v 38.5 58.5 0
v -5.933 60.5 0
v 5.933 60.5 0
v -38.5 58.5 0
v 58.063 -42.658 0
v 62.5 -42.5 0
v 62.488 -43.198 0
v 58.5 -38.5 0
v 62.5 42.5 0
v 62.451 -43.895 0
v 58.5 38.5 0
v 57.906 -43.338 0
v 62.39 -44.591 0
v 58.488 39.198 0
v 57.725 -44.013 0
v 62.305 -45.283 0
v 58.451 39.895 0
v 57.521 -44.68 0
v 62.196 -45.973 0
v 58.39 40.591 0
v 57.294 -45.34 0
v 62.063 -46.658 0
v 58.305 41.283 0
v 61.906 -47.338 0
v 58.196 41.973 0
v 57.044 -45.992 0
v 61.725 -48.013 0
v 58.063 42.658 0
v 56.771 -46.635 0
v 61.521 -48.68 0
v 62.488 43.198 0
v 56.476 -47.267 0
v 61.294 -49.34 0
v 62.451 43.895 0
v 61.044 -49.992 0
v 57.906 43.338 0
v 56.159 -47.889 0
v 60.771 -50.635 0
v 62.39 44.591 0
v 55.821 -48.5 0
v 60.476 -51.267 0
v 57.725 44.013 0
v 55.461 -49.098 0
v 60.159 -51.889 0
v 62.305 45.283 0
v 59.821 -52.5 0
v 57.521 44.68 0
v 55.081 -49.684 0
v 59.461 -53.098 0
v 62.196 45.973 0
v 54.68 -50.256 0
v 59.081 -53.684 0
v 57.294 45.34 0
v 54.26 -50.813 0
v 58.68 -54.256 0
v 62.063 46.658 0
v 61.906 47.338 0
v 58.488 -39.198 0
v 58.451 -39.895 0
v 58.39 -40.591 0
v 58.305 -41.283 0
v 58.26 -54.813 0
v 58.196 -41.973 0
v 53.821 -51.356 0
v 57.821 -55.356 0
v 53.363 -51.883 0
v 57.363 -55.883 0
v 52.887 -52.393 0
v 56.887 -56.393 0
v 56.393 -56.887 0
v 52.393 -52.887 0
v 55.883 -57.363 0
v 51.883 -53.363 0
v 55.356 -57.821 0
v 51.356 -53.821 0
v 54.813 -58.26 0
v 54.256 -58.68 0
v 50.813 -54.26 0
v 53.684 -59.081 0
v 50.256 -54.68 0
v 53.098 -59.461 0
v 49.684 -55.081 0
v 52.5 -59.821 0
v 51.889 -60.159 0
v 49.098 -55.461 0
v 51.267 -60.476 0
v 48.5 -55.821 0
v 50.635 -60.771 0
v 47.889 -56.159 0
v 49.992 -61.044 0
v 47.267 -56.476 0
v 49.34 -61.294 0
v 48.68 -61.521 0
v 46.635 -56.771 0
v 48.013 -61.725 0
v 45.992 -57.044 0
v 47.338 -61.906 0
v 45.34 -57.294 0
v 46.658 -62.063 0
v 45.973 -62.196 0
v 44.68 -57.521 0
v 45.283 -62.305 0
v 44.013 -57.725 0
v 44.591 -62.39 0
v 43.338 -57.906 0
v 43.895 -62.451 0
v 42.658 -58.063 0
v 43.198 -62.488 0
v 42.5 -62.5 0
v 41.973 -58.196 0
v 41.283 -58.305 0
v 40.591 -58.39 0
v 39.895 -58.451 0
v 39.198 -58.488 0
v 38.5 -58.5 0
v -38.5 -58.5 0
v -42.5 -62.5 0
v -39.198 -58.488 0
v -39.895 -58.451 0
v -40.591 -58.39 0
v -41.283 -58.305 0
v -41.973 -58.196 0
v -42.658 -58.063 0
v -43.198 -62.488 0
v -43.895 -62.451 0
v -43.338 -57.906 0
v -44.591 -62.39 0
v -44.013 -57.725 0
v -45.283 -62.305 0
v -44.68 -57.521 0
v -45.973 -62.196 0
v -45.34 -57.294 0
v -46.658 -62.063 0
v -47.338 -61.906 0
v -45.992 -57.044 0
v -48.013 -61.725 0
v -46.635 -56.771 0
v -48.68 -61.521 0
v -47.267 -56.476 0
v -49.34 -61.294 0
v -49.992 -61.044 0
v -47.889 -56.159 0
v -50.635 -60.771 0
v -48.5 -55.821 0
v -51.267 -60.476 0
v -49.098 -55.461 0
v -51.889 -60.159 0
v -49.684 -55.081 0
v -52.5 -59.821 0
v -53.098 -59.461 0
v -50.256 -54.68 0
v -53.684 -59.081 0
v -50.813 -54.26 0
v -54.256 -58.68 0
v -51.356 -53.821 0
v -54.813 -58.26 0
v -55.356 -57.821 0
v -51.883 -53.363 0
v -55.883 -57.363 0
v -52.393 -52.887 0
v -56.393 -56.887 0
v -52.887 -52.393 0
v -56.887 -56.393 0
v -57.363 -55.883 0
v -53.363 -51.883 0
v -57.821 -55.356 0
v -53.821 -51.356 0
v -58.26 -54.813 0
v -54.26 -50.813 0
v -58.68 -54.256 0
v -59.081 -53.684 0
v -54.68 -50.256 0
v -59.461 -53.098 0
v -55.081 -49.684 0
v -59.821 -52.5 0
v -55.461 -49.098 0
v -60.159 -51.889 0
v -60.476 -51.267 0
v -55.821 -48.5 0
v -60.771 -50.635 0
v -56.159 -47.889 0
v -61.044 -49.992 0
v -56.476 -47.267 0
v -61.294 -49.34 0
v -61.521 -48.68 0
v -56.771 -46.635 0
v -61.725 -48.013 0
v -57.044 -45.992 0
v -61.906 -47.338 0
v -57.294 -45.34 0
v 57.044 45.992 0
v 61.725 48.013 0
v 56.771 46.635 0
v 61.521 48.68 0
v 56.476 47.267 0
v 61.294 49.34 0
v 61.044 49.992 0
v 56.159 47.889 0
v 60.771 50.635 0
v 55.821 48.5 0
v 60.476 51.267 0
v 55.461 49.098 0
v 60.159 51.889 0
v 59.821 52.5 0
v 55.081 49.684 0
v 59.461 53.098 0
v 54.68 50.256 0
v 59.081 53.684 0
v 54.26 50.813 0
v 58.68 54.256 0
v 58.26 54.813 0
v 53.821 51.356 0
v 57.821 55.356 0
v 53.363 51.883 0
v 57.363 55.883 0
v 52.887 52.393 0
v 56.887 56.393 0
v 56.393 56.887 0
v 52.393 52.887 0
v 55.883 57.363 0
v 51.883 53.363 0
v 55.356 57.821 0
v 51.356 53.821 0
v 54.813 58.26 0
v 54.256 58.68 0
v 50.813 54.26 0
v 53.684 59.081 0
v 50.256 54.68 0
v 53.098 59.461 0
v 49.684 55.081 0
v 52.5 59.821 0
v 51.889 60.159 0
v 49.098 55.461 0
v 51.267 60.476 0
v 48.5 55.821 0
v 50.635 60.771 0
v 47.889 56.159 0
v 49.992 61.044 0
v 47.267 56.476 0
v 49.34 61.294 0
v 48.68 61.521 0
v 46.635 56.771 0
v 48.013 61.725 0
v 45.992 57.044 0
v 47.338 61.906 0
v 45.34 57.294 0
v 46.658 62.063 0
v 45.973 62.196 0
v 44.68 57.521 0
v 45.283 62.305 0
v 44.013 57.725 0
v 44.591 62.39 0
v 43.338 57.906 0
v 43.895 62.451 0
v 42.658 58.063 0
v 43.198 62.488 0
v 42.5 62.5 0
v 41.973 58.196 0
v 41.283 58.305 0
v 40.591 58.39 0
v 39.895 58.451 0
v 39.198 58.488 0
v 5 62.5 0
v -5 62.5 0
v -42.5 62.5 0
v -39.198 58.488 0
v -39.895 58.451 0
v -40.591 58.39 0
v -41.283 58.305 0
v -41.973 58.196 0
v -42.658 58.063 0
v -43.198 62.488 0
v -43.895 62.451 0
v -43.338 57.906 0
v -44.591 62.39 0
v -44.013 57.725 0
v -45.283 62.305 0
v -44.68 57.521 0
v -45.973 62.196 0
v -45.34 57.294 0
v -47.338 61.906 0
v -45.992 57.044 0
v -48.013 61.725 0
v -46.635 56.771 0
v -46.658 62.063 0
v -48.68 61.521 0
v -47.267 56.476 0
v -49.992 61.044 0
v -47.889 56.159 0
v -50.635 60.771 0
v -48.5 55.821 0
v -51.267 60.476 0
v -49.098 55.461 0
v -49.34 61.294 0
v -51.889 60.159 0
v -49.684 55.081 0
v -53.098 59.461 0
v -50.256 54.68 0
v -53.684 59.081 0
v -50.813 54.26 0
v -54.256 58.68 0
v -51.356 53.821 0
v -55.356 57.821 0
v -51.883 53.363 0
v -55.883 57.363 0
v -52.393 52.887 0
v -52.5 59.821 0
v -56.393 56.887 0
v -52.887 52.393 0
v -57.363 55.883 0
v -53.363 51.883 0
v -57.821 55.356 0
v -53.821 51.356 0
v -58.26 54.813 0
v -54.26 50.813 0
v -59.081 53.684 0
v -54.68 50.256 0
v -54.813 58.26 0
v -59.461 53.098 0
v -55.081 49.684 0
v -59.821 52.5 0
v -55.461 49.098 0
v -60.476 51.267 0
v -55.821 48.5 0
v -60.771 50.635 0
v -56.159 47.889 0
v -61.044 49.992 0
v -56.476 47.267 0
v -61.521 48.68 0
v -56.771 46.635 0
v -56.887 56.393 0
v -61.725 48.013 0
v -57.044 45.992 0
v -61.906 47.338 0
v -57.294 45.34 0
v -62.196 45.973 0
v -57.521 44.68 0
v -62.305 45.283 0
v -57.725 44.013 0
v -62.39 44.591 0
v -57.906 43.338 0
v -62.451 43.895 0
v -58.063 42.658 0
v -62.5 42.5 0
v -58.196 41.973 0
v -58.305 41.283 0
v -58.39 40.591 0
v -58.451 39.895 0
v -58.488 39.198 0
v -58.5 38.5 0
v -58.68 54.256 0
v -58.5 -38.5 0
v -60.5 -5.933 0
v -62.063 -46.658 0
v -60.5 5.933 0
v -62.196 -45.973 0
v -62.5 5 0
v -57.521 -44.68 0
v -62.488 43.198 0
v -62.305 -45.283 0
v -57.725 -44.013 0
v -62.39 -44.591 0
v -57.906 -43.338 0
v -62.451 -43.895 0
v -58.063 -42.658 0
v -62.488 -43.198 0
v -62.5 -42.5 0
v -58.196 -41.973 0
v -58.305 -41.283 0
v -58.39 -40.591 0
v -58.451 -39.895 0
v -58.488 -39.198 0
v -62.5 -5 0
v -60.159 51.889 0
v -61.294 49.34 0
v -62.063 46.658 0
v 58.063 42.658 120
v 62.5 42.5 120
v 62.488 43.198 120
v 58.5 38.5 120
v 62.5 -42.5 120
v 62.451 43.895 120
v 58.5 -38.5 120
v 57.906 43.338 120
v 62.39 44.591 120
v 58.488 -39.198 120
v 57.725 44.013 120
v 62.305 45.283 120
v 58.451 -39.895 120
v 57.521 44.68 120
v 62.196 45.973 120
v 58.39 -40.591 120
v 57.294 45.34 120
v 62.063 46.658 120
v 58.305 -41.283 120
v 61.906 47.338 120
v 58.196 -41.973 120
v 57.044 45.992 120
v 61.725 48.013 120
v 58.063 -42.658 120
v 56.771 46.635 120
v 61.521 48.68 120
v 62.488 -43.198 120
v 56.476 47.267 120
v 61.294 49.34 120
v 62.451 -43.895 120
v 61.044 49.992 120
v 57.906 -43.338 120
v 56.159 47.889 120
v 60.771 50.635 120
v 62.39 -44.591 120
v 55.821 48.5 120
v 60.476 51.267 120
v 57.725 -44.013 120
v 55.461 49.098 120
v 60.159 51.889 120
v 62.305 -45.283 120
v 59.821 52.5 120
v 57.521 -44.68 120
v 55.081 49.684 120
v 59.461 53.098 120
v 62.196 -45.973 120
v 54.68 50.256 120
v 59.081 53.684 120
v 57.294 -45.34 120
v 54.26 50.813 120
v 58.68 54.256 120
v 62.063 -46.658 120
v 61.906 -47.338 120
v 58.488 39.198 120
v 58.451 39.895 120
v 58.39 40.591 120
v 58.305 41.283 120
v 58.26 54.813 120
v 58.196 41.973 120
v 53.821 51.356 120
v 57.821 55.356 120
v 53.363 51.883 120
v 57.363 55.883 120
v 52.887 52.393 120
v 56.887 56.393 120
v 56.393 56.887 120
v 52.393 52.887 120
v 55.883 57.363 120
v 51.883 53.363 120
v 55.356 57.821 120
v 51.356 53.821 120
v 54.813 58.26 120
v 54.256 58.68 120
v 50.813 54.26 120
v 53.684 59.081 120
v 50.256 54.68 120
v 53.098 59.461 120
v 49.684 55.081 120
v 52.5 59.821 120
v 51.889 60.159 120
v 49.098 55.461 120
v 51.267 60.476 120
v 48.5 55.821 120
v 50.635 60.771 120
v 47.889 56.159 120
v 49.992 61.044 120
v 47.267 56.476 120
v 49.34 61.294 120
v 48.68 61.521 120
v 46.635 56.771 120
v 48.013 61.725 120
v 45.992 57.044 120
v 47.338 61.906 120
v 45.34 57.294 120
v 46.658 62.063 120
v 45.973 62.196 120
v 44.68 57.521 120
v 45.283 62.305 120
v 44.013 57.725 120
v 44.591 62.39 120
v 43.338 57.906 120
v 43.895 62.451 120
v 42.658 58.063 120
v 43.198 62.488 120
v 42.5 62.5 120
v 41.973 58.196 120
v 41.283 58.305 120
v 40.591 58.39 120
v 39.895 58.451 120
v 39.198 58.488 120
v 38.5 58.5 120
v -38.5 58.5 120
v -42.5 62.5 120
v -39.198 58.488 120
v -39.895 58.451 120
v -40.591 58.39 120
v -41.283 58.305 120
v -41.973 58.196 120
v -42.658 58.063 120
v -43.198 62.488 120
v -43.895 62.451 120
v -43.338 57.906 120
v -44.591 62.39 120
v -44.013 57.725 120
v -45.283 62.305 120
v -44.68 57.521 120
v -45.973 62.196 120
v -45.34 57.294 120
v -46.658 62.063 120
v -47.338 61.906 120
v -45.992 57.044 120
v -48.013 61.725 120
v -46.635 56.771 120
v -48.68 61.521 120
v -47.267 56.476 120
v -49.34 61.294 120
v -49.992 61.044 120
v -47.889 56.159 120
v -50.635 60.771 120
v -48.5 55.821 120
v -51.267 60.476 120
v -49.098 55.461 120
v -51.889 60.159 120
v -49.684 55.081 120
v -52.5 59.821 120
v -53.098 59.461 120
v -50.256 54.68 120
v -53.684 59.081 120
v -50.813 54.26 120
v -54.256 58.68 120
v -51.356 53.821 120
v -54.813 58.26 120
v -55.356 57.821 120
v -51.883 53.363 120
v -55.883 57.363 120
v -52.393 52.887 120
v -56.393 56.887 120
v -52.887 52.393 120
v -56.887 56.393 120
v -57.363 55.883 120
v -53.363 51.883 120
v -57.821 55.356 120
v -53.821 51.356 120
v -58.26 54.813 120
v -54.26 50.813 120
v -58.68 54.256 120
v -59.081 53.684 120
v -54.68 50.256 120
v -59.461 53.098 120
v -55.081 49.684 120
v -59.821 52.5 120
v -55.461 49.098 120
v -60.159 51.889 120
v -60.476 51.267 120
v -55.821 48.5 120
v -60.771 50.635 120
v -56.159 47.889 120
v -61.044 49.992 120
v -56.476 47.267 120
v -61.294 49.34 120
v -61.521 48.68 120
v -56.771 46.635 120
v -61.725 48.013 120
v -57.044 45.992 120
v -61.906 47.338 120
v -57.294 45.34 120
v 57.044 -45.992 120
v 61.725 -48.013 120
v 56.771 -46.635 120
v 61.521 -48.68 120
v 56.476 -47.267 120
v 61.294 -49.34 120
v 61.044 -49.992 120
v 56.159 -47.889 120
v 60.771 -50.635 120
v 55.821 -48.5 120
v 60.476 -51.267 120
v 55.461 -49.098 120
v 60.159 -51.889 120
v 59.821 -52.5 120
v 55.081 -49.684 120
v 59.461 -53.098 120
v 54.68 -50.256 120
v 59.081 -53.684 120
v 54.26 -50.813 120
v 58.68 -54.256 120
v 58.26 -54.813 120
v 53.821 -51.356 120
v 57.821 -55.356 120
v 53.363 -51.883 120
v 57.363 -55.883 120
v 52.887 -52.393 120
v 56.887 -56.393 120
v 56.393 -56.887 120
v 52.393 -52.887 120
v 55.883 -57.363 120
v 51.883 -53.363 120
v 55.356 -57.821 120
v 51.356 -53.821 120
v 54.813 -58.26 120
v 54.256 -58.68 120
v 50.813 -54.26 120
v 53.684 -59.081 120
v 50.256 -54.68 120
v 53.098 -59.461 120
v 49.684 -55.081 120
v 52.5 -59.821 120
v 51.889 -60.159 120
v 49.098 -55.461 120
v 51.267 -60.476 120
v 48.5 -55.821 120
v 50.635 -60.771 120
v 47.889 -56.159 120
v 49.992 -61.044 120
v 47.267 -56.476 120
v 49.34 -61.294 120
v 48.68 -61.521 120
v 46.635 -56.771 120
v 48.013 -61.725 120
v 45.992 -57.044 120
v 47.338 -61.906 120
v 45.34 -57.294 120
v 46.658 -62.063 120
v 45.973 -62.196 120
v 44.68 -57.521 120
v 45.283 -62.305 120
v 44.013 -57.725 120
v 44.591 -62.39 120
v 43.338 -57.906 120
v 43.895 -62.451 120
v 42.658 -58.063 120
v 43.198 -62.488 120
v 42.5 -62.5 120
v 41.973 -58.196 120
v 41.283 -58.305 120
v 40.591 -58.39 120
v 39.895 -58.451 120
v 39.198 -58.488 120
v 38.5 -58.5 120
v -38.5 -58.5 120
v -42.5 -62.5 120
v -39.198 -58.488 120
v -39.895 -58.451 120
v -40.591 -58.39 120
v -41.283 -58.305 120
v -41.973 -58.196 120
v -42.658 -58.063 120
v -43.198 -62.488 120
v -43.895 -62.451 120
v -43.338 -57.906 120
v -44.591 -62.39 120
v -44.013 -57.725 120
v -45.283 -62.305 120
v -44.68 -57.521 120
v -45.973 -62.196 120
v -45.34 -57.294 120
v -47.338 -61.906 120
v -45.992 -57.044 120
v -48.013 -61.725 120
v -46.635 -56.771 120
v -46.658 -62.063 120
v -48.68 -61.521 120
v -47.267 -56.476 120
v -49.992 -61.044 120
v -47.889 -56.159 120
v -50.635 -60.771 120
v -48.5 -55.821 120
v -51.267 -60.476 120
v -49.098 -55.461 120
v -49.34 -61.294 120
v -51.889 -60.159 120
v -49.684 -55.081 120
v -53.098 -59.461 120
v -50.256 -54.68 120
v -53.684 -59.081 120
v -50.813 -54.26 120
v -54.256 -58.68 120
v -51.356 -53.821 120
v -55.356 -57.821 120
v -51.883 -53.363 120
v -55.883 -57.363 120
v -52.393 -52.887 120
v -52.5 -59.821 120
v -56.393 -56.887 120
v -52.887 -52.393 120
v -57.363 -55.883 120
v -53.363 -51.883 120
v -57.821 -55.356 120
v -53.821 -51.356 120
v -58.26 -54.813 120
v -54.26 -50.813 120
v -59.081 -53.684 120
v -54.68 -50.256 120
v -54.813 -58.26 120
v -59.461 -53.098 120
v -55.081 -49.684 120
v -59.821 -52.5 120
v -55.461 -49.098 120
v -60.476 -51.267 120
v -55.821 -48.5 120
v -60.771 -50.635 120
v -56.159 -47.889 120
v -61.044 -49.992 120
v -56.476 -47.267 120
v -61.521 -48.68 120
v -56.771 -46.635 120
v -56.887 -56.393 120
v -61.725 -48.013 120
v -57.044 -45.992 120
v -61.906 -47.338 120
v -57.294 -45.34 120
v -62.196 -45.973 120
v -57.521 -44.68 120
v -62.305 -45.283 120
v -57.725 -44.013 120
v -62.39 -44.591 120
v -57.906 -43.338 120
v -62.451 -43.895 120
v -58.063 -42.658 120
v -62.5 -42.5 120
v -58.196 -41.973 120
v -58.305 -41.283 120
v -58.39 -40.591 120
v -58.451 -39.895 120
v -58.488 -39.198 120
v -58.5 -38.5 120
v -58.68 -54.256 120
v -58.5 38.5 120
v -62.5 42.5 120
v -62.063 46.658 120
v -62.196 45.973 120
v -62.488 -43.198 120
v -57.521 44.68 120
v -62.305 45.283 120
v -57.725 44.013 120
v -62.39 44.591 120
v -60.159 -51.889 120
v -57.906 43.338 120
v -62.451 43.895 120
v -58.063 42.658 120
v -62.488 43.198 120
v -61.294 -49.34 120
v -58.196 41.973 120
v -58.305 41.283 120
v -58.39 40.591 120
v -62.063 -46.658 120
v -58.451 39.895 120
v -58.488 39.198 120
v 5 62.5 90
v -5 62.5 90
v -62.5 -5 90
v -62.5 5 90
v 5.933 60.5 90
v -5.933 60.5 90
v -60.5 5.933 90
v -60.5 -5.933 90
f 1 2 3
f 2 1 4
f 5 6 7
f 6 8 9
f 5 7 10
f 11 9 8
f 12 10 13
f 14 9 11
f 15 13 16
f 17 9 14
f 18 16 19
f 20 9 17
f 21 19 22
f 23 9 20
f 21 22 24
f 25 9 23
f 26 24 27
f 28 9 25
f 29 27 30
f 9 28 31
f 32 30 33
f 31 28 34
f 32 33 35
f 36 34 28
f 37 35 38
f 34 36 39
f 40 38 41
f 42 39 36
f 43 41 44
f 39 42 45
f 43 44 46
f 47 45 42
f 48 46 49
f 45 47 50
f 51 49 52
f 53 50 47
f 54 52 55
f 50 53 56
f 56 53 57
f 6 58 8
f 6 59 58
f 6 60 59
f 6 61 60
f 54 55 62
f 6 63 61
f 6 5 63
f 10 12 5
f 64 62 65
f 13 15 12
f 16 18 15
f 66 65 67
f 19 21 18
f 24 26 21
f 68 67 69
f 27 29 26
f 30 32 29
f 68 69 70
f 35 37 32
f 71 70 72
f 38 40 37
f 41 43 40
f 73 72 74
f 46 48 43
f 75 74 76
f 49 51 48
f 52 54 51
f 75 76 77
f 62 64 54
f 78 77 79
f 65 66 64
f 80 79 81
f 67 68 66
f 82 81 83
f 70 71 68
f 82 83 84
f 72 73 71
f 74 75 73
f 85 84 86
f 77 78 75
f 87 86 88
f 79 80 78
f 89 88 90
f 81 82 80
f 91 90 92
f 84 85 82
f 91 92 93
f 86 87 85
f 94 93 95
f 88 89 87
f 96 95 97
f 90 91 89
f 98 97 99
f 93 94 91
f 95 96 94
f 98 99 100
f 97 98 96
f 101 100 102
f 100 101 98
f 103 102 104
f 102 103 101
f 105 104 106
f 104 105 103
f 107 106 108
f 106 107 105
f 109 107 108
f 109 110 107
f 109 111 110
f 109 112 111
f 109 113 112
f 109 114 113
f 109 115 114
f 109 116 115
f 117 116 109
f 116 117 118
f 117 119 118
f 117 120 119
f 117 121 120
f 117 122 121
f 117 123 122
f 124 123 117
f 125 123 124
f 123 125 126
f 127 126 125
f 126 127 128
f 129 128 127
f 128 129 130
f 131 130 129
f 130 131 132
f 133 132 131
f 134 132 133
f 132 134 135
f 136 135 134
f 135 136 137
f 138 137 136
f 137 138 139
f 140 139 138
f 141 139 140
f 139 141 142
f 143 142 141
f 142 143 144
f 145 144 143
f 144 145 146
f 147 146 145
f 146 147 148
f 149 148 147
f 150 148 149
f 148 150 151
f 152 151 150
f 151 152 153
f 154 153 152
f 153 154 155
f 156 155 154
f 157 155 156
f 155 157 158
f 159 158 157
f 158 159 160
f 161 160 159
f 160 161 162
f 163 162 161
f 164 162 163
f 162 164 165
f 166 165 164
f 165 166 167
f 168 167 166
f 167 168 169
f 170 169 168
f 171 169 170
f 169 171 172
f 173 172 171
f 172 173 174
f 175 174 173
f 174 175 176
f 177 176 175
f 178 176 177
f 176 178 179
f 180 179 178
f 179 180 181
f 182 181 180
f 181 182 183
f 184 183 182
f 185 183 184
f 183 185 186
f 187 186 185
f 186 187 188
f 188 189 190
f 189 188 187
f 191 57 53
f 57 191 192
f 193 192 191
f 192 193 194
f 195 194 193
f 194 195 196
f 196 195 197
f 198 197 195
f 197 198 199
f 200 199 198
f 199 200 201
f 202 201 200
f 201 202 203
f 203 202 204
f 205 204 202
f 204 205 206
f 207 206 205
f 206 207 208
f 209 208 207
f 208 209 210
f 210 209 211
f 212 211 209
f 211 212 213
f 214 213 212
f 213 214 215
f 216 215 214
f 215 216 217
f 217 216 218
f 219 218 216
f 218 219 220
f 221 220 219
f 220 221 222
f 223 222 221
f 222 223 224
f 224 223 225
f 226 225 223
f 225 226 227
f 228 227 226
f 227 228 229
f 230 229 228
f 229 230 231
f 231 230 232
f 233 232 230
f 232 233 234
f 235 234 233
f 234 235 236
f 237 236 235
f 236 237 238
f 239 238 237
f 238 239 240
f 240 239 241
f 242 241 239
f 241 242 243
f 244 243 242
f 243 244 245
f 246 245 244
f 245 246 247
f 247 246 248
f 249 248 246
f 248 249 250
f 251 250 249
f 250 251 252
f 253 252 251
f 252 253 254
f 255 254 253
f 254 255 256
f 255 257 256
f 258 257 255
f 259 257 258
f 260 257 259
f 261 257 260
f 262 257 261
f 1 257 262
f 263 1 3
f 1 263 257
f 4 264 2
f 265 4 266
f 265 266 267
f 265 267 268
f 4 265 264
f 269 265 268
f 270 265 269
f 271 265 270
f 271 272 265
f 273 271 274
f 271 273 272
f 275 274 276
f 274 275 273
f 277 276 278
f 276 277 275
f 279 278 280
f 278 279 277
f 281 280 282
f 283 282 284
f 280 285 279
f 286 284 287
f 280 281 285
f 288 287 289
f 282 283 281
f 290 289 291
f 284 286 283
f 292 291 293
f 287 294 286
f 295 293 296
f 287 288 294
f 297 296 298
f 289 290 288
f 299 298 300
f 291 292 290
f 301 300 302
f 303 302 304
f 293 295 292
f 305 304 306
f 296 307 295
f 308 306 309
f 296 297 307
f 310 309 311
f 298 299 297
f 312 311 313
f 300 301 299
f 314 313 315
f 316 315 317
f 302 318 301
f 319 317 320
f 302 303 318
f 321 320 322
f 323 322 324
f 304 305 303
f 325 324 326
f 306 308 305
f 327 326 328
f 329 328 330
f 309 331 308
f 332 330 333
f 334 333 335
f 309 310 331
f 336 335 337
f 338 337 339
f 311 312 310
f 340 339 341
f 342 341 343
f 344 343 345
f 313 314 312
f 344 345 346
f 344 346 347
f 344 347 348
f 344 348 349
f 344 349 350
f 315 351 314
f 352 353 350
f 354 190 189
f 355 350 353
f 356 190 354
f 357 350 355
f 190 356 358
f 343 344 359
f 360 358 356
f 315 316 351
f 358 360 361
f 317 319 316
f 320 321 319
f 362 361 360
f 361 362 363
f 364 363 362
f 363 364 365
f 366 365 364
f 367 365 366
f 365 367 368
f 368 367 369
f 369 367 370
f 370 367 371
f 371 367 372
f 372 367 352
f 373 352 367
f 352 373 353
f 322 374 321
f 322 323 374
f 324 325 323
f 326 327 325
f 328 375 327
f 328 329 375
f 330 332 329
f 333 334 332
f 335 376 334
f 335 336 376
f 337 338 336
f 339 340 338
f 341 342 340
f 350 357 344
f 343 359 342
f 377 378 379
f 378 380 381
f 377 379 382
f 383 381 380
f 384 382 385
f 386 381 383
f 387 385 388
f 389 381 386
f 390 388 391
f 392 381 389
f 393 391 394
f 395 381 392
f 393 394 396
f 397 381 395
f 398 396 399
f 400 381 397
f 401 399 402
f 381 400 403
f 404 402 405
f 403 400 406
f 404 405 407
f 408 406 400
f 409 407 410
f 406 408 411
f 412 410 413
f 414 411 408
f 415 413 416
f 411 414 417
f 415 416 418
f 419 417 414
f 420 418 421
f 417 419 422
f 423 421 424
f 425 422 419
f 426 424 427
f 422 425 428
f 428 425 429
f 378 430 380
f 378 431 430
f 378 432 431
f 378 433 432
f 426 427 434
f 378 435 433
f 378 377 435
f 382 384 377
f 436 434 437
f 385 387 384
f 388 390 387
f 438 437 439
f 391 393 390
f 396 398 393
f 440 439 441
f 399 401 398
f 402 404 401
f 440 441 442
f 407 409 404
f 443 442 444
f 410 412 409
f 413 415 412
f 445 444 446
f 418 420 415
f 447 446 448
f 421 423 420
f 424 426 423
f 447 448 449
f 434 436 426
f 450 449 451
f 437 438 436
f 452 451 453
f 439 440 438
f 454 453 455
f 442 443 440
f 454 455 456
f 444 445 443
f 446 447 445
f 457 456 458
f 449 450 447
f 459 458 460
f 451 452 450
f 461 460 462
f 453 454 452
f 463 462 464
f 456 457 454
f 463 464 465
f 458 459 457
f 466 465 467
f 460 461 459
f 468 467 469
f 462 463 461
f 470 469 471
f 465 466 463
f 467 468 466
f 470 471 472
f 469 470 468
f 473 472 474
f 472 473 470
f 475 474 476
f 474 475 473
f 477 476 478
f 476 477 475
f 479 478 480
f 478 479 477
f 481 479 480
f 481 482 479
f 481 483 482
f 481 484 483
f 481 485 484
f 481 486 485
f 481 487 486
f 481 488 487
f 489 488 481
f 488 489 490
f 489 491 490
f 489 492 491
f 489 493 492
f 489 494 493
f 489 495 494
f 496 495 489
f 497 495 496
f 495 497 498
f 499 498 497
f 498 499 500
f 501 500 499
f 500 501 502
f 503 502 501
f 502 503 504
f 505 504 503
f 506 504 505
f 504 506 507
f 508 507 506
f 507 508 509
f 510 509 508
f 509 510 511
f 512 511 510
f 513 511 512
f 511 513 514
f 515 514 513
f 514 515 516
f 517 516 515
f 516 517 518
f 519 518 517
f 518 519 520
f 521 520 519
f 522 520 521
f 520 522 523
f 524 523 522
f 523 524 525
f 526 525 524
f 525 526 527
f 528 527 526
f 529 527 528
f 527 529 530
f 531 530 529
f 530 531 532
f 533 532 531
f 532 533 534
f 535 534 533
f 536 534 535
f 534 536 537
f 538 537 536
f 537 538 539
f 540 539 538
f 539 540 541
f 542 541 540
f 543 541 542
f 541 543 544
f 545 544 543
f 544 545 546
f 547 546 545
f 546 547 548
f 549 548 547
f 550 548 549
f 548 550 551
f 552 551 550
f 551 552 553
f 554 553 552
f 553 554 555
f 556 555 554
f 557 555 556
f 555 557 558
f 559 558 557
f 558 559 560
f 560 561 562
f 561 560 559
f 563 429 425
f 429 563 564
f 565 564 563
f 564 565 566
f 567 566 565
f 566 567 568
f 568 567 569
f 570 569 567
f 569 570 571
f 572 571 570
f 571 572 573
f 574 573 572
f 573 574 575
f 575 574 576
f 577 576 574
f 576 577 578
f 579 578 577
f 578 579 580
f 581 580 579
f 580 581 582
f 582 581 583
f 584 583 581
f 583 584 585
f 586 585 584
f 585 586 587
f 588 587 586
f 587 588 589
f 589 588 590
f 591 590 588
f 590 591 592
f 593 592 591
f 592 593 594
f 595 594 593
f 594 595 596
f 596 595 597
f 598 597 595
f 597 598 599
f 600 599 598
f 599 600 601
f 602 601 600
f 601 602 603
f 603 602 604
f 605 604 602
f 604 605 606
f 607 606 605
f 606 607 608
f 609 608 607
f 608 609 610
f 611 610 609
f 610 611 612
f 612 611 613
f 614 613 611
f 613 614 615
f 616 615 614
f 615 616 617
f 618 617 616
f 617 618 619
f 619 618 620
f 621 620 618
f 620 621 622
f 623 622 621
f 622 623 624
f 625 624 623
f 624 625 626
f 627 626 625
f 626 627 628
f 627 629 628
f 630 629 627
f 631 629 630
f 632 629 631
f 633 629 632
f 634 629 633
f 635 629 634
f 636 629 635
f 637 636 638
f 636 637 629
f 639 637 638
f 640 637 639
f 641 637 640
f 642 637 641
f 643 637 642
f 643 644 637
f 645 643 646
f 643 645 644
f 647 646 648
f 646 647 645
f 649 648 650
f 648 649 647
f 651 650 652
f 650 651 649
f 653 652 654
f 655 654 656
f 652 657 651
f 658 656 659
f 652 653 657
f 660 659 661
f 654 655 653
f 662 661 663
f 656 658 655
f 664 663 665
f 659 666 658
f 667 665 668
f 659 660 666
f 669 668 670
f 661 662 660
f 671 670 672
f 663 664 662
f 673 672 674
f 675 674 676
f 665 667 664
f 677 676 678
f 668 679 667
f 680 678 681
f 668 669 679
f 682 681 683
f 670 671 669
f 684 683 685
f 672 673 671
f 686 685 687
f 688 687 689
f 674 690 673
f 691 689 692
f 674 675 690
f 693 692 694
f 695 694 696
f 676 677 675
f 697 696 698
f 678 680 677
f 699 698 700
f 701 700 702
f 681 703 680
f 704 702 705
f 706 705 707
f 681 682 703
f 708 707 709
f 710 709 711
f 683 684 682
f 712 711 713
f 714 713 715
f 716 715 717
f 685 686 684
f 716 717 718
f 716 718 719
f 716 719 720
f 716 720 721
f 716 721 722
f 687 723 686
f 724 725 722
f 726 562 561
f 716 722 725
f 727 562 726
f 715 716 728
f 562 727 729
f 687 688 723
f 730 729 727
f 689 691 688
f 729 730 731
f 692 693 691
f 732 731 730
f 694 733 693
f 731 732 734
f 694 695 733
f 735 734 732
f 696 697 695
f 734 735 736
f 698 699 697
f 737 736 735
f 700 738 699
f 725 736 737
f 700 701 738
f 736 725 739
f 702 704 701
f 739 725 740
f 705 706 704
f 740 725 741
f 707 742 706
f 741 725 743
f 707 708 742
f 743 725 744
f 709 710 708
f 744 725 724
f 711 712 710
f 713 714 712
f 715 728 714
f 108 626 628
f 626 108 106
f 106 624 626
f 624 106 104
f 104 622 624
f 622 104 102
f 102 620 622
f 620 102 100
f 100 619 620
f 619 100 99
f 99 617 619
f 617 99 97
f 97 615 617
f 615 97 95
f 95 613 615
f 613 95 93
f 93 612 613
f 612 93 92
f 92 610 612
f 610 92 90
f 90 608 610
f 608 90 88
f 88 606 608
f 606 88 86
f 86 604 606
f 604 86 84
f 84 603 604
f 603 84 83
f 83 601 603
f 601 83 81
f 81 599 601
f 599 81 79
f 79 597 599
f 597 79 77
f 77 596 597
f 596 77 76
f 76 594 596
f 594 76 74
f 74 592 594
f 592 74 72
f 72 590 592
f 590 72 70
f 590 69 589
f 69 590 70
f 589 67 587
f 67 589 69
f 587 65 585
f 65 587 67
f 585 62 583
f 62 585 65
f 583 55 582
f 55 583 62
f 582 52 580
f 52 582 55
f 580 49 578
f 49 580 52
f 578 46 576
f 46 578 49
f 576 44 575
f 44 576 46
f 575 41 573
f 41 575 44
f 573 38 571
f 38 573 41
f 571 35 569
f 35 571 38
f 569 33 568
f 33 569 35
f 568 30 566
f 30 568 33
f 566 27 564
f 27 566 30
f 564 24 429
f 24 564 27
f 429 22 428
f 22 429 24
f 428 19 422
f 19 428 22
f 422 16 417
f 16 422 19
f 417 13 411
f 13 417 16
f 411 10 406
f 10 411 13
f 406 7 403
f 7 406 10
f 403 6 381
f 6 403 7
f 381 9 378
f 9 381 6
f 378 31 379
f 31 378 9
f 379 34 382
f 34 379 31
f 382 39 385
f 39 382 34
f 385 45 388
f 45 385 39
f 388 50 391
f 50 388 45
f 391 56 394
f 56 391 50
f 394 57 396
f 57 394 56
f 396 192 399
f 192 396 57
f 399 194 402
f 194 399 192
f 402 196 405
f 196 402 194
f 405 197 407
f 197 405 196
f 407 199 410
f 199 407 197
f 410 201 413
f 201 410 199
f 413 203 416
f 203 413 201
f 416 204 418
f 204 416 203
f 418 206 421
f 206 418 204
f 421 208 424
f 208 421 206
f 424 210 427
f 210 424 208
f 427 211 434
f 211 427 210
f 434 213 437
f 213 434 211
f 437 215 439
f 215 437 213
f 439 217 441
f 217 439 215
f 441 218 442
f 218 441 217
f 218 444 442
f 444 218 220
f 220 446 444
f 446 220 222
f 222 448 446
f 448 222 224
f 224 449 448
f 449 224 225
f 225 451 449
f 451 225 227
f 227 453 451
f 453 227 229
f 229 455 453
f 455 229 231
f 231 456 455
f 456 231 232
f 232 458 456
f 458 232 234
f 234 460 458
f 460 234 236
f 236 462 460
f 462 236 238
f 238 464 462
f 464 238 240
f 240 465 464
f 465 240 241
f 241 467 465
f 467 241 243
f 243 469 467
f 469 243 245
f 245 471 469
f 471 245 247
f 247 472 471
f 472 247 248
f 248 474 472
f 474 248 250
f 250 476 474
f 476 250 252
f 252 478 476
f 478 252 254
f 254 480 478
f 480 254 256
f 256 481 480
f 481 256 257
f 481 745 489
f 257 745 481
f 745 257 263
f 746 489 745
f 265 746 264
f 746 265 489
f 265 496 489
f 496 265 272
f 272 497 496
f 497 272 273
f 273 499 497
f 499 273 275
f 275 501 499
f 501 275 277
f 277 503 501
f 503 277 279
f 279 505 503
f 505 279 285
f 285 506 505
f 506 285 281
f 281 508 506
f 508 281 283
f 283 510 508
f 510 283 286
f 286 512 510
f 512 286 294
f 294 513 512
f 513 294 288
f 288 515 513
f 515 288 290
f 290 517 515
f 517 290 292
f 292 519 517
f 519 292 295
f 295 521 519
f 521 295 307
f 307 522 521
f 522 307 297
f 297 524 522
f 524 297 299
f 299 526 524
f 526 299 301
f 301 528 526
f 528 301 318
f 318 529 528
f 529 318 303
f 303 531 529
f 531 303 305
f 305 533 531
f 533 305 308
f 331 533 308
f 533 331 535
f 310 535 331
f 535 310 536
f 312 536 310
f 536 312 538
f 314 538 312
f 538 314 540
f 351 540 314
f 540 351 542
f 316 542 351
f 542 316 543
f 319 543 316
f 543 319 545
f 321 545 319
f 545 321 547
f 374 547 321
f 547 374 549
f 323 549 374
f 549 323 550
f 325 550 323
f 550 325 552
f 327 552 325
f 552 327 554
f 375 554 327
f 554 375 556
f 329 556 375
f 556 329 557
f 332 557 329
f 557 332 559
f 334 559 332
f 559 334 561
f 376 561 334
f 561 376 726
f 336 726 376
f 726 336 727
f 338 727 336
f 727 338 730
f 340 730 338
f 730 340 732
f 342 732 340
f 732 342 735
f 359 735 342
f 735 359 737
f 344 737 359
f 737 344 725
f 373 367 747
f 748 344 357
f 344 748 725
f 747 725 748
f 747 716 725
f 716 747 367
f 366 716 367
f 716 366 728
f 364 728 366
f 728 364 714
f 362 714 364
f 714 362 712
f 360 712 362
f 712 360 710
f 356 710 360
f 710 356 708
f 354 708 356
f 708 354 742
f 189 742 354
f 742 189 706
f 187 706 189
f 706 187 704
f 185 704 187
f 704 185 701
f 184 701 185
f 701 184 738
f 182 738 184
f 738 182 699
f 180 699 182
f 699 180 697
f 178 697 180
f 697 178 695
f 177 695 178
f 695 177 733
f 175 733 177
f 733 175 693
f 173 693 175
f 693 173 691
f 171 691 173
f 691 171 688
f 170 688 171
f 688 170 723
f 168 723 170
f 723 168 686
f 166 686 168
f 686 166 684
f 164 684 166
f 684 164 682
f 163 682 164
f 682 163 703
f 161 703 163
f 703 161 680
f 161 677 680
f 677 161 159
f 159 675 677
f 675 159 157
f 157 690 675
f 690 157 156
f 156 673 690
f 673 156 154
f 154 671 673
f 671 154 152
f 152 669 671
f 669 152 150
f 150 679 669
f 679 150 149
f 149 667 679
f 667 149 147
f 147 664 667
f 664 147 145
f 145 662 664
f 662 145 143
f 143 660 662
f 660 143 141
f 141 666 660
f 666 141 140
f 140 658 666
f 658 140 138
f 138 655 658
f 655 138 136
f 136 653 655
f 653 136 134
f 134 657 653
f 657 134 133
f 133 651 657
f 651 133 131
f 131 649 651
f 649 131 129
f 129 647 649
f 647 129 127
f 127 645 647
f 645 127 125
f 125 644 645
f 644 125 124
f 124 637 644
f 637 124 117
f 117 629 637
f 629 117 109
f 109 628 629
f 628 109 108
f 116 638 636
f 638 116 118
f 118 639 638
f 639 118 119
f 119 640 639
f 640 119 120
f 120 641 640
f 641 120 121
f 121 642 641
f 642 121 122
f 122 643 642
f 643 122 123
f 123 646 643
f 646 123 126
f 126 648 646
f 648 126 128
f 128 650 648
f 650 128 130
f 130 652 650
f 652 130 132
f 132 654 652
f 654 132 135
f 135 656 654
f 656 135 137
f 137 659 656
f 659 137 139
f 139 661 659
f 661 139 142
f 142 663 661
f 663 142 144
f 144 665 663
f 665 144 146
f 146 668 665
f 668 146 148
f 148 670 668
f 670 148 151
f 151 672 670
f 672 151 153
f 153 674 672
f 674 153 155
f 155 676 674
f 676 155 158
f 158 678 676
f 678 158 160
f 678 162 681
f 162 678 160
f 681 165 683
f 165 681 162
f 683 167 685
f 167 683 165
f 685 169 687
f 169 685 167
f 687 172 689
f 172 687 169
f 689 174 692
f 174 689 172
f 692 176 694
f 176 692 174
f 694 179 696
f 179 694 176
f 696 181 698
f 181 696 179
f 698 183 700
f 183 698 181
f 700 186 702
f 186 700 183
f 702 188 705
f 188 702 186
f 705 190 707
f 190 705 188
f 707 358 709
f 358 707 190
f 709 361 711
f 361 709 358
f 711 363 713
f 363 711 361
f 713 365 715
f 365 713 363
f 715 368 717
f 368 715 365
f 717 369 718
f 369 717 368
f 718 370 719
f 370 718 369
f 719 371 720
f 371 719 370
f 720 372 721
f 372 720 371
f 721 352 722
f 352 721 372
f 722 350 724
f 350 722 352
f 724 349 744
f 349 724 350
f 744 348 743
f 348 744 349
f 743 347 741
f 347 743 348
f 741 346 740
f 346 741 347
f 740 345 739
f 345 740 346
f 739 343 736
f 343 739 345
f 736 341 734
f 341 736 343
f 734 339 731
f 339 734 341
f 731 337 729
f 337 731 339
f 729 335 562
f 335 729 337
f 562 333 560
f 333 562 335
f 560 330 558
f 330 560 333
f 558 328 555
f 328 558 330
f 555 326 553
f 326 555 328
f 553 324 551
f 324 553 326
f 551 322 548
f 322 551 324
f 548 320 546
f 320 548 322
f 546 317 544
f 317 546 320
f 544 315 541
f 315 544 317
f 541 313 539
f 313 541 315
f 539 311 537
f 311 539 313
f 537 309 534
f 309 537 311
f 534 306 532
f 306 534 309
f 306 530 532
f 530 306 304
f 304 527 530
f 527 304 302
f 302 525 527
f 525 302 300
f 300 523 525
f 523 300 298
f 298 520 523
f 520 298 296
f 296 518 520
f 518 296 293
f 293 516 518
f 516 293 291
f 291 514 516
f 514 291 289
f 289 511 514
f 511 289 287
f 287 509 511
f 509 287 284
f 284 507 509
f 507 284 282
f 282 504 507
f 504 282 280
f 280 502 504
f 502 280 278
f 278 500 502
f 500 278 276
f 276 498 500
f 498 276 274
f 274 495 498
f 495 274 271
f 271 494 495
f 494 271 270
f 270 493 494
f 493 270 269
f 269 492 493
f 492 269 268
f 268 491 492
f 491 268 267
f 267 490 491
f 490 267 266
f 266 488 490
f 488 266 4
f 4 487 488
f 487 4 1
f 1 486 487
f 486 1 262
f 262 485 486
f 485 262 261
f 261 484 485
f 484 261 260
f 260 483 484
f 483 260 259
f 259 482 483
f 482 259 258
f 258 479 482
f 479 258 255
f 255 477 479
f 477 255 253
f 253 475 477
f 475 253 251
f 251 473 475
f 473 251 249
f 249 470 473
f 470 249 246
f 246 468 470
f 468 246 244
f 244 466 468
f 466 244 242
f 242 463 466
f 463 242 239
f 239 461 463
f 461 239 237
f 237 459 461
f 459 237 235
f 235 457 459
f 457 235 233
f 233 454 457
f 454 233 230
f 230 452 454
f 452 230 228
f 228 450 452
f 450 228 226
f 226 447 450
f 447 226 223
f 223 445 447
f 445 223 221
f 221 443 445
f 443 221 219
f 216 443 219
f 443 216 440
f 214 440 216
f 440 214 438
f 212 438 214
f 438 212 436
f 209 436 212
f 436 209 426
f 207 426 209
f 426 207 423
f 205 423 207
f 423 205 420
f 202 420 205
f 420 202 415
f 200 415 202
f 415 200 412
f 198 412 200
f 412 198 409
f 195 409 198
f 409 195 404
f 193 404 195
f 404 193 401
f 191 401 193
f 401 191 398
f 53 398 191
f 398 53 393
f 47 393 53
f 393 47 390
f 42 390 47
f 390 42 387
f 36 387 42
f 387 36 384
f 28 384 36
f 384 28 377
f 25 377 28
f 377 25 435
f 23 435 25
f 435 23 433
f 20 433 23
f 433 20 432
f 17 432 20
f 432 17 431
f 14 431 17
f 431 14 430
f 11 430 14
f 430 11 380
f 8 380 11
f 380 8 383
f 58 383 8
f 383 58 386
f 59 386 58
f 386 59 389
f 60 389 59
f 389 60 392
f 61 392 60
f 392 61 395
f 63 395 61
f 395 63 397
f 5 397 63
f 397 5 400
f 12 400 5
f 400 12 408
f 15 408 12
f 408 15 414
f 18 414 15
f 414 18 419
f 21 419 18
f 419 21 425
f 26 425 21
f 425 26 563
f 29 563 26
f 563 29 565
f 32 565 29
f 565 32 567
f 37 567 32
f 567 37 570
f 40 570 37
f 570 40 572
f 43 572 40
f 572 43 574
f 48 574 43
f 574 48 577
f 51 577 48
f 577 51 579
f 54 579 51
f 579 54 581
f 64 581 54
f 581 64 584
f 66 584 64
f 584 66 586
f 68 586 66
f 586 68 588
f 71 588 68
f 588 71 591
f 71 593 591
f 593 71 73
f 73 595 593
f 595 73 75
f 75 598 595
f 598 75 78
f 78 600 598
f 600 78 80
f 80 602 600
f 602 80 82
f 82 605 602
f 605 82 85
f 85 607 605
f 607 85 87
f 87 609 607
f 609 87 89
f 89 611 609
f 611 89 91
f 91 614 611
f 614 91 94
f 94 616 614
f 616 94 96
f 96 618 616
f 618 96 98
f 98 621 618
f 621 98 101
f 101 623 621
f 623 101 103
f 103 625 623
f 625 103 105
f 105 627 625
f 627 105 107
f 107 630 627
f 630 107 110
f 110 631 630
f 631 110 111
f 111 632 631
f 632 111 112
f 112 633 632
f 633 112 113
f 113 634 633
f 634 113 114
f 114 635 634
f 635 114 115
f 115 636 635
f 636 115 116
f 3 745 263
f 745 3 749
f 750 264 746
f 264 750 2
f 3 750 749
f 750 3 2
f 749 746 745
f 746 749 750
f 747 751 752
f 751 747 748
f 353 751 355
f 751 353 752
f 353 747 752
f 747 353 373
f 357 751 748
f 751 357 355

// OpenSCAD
// Two-Color Shelf — proof of concept for multi-color 3MF export
// Splits the shelf into a body and a colored accent band along the top rim.
//
// Render specific parts via the command line:
//   openscad -D 'part="body"' -o body.stl shelf_two_color.scad
//   openscad -D 'part="accent"' -o accent.stl shelf_two_color.scad
//
// Units: millimeters

// --- Part Selection ---
part = "all";  // "body", "accent", or "all"

// --- Shelf Parameters ---
width  = 125;
height = 125;
depth  = 120;
wall   = 4;
radius = 20;

// --- Accent Band ---
accent_height = 8;  // height of the colored top band

// --- Track Parameters ---
track_width      = 10;
track_depth      = 2;
track_length_pct = 75;
dovetail_angle   = 25;

tracks_top    = 1;
tracks_bottom = 0;
tracks_left   = 1;
tracks_right  = 0;

$fn = 180;

track_length   = depth * track_length_pct / 100;
dovetail_extra = track_depth * tan(dovetail_angle);

module rounded_rect(w, h, r) {
    offset(r = r)
        square([w - 2 * r, h - 2 * r], center = true);
}

module shelf_body_shape(w, h, d, wall, r) {
    linear_extrude(height = d)
        difference() {
            rounded_rect(w, h, r);
            rounded_rect(w - 2 * wall, h - 2 * wall, r);
        }
}

module horizontal_tracks(count, wall_width, wall_y, inward_dir) {
    if (count > 0) {
        segment = wall_width / count;
        for (i = [0 : count - 1]) {
            x_pos = -wall_width / 2 + segment * (i + 0.5);
            linear_extrude(height = track_length)
                polygon([
                    [x_pos - track_width / 2,                  wall_y],
                    [x_pos + track_width / 2,                  wall_y],
                    [x_pos + track_width / 2 + dovetail_extra, wall_y + inward_dir * track_depth],
                    [x_pos - track_width / 2 - dovetail_extra, wall_y + inward_dir * track_depth]
                ]);
        }
    }
}

module vertical_tracks(count, wall_height, wall_x, inward_dir) {
    if (count > 0) {
        segment = wall_height / count;
        for (i = [0 : count - 1]) {
            y_pos = -wall_height / 2 + segment * (i + 0.5);
            linear_extrude(height = track_length)
                polygon([
                    [wall_x,                            y_pos - track_width / 2],
                    [wall_x,                            y_pos + track_width / 2],
                    [wall_x + inward_dir * track_depth, y_pos + track_width / 2 + dovetail_extra],
                    [wall_x + inward_dir * track_depth, y_pos - track_width / 2 - dovetail_extra]
                ]);
        }
    }
}

// Full shelf with tracks subtracted
module full_shelf() {
    difference() {
        shelf_body_shape(width, height, depth, wall, radius);
        horizontal_tracks(tracks_top, width, height / 2, -1);
        horizontal_tracks(tracks_bottom, width, -height / 2, 1);
        vertical_tracks(tracks_right, height, width / 2, -1);
        vertical_tracks(tracks_left, height, -width / 2, 1);
    }
}

// Accent band: top rim of the shelf
module accent_region() {
    translate([0, height / 2 - accent_height / 2, depth / 2])
        cube([width + 1, accent_height, depth + 1], center = true);
}

// Accent piece (colored top band)
module shelf_accent() {
    intersection() {
        full_shelf();
        accent_region();
    }
}

// Body (everything except the accent band)
module shelf_body() {
    difference() {
        full_shelf();
        accent_region();
    }
}

// --- Render selected part ---
if (part == "body") {
    shelf_body();
} else if (part == "accent") {
    shelf_accent();
} else {
    shelf_body();
    color("royalblue") shelf_accent();
}
